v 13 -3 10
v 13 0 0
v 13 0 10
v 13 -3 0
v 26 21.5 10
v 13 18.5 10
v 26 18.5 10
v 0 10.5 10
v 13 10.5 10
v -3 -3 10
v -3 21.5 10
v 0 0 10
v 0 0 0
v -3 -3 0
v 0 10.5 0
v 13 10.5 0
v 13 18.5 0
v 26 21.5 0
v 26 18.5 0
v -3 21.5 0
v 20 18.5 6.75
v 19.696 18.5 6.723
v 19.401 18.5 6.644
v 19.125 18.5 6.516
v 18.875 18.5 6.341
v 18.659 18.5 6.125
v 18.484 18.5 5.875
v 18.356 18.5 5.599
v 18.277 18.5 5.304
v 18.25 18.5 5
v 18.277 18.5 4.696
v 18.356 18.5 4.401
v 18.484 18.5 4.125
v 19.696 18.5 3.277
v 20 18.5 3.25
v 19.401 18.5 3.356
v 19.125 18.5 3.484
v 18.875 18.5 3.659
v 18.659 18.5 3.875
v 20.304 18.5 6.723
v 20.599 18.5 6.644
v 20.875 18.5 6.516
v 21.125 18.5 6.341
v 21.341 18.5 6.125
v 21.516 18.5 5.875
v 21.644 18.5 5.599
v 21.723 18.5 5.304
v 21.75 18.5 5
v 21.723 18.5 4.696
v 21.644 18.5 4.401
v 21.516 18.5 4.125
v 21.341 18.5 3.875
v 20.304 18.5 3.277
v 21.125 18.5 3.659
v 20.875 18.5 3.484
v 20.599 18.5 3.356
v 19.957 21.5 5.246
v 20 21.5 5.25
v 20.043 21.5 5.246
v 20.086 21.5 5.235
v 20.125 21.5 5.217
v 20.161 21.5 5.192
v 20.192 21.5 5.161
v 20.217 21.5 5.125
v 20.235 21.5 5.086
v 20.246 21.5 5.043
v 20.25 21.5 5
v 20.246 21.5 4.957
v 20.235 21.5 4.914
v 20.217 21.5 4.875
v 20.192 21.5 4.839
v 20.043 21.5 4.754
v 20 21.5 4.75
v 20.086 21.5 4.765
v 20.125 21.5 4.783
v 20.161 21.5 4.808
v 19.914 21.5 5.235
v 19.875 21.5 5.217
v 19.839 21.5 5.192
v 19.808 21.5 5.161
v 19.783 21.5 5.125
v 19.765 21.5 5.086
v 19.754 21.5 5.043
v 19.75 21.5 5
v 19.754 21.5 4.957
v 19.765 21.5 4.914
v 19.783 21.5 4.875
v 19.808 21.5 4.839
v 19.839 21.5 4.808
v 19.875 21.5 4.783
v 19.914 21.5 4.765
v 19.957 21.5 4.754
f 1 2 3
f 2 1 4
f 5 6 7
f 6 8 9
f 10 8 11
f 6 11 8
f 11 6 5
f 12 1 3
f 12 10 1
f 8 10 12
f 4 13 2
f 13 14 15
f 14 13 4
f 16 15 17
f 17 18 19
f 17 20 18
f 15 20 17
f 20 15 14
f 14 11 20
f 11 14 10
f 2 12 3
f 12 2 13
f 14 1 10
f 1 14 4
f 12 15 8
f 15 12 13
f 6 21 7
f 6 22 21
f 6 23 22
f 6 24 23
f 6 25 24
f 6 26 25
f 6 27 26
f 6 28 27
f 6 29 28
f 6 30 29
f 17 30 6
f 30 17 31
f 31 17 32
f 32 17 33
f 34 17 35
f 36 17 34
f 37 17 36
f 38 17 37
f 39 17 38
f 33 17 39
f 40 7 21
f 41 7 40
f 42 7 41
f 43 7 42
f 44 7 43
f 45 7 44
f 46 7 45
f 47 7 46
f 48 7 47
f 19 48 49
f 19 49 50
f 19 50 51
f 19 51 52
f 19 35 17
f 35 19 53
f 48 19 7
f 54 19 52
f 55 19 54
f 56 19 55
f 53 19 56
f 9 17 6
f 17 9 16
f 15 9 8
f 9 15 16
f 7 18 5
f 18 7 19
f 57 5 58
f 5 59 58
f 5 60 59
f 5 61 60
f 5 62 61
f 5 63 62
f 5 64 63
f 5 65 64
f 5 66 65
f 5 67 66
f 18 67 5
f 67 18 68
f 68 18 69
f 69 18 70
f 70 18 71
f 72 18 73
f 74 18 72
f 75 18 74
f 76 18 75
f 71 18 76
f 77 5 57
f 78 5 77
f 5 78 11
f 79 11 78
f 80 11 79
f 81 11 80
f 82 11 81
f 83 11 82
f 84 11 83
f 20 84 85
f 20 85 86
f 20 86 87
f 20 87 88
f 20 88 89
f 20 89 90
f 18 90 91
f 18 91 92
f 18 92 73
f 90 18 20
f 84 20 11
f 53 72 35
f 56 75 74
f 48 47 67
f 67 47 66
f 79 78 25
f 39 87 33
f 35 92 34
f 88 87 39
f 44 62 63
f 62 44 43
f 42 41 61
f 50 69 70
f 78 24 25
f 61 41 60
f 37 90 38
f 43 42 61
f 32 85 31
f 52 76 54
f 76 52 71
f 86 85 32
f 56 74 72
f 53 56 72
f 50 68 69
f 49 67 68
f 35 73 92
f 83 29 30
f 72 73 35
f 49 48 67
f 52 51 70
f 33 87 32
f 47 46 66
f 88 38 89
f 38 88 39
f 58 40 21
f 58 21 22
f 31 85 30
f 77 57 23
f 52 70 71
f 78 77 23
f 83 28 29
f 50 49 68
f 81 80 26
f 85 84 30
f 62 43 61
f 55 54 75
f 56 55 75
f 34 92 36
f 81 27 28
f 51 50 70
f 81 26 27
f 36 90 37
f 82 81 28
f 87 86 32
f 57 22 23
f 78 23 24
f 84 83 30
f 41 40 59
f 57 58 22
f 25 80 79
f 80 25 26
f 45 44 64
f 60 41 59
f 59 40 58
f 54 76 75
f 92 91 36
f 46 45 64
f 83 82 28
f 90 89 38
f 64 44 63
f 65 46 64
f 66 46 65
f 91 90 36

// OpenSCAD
// OpenSCAD Arbeitsleute Küche
// https://openscad.org/cheatsheet/index.html
$fn=36;

t=3;

abstand=8; //8mm Abstand von Wand
hoehe=161;
breite=140;
dicke=10.5;
randlr=13;
rando=12;
randu=28.5;

//width holder
wh=t+randlr;
//heigt holder
hh = 10;

module Part1() {
    color("brown")
    translate([0,0,0]) 
    cube([breite,dicke,hoehe]);
}

module Part2() {
    color("white")
    translate([randlr,0,randu]) 
    cube([breite-randlr*2,3,hoehe-rando-randu]);
}

module Lampe()
{
    difference()
    {
        Part1();
        Part2();
    }
}

//Lampe();

module Part3()
{
    color("gray")
    translate([-t,-t,0]) 
    cube([wh, t, hh]); //rcube
}

module Part4()
{
    color("gray")
    translate([-t,0,0]) 
    cube([t,dicke+abstand,hh]); //rcube
}

module Part5() {
    color("gray")
    translate([0,dicke,0]) 
    cube([randlr,abstand,hh]);
}

//Hinter dem Abstandhalter für die Schraube
module Part6() {
    color("gray")
    translate([-t,dicke+abstand,0]) 
    cube([randlr+t+randlr,t,hh]);
}

module Part7() {    
    translate([randlr+randlr-t-t,dicke+abstand+t,hh/2]) 
    rotate([90,0,0])
    color("blue")
    cylinder(h=t, d2=3.5, d1=0.5);
}

module holder()
{
    Part3();
    Part4();
    Part5();
    Part6();
}

difference()
{
    holder();
    Part7();
}
